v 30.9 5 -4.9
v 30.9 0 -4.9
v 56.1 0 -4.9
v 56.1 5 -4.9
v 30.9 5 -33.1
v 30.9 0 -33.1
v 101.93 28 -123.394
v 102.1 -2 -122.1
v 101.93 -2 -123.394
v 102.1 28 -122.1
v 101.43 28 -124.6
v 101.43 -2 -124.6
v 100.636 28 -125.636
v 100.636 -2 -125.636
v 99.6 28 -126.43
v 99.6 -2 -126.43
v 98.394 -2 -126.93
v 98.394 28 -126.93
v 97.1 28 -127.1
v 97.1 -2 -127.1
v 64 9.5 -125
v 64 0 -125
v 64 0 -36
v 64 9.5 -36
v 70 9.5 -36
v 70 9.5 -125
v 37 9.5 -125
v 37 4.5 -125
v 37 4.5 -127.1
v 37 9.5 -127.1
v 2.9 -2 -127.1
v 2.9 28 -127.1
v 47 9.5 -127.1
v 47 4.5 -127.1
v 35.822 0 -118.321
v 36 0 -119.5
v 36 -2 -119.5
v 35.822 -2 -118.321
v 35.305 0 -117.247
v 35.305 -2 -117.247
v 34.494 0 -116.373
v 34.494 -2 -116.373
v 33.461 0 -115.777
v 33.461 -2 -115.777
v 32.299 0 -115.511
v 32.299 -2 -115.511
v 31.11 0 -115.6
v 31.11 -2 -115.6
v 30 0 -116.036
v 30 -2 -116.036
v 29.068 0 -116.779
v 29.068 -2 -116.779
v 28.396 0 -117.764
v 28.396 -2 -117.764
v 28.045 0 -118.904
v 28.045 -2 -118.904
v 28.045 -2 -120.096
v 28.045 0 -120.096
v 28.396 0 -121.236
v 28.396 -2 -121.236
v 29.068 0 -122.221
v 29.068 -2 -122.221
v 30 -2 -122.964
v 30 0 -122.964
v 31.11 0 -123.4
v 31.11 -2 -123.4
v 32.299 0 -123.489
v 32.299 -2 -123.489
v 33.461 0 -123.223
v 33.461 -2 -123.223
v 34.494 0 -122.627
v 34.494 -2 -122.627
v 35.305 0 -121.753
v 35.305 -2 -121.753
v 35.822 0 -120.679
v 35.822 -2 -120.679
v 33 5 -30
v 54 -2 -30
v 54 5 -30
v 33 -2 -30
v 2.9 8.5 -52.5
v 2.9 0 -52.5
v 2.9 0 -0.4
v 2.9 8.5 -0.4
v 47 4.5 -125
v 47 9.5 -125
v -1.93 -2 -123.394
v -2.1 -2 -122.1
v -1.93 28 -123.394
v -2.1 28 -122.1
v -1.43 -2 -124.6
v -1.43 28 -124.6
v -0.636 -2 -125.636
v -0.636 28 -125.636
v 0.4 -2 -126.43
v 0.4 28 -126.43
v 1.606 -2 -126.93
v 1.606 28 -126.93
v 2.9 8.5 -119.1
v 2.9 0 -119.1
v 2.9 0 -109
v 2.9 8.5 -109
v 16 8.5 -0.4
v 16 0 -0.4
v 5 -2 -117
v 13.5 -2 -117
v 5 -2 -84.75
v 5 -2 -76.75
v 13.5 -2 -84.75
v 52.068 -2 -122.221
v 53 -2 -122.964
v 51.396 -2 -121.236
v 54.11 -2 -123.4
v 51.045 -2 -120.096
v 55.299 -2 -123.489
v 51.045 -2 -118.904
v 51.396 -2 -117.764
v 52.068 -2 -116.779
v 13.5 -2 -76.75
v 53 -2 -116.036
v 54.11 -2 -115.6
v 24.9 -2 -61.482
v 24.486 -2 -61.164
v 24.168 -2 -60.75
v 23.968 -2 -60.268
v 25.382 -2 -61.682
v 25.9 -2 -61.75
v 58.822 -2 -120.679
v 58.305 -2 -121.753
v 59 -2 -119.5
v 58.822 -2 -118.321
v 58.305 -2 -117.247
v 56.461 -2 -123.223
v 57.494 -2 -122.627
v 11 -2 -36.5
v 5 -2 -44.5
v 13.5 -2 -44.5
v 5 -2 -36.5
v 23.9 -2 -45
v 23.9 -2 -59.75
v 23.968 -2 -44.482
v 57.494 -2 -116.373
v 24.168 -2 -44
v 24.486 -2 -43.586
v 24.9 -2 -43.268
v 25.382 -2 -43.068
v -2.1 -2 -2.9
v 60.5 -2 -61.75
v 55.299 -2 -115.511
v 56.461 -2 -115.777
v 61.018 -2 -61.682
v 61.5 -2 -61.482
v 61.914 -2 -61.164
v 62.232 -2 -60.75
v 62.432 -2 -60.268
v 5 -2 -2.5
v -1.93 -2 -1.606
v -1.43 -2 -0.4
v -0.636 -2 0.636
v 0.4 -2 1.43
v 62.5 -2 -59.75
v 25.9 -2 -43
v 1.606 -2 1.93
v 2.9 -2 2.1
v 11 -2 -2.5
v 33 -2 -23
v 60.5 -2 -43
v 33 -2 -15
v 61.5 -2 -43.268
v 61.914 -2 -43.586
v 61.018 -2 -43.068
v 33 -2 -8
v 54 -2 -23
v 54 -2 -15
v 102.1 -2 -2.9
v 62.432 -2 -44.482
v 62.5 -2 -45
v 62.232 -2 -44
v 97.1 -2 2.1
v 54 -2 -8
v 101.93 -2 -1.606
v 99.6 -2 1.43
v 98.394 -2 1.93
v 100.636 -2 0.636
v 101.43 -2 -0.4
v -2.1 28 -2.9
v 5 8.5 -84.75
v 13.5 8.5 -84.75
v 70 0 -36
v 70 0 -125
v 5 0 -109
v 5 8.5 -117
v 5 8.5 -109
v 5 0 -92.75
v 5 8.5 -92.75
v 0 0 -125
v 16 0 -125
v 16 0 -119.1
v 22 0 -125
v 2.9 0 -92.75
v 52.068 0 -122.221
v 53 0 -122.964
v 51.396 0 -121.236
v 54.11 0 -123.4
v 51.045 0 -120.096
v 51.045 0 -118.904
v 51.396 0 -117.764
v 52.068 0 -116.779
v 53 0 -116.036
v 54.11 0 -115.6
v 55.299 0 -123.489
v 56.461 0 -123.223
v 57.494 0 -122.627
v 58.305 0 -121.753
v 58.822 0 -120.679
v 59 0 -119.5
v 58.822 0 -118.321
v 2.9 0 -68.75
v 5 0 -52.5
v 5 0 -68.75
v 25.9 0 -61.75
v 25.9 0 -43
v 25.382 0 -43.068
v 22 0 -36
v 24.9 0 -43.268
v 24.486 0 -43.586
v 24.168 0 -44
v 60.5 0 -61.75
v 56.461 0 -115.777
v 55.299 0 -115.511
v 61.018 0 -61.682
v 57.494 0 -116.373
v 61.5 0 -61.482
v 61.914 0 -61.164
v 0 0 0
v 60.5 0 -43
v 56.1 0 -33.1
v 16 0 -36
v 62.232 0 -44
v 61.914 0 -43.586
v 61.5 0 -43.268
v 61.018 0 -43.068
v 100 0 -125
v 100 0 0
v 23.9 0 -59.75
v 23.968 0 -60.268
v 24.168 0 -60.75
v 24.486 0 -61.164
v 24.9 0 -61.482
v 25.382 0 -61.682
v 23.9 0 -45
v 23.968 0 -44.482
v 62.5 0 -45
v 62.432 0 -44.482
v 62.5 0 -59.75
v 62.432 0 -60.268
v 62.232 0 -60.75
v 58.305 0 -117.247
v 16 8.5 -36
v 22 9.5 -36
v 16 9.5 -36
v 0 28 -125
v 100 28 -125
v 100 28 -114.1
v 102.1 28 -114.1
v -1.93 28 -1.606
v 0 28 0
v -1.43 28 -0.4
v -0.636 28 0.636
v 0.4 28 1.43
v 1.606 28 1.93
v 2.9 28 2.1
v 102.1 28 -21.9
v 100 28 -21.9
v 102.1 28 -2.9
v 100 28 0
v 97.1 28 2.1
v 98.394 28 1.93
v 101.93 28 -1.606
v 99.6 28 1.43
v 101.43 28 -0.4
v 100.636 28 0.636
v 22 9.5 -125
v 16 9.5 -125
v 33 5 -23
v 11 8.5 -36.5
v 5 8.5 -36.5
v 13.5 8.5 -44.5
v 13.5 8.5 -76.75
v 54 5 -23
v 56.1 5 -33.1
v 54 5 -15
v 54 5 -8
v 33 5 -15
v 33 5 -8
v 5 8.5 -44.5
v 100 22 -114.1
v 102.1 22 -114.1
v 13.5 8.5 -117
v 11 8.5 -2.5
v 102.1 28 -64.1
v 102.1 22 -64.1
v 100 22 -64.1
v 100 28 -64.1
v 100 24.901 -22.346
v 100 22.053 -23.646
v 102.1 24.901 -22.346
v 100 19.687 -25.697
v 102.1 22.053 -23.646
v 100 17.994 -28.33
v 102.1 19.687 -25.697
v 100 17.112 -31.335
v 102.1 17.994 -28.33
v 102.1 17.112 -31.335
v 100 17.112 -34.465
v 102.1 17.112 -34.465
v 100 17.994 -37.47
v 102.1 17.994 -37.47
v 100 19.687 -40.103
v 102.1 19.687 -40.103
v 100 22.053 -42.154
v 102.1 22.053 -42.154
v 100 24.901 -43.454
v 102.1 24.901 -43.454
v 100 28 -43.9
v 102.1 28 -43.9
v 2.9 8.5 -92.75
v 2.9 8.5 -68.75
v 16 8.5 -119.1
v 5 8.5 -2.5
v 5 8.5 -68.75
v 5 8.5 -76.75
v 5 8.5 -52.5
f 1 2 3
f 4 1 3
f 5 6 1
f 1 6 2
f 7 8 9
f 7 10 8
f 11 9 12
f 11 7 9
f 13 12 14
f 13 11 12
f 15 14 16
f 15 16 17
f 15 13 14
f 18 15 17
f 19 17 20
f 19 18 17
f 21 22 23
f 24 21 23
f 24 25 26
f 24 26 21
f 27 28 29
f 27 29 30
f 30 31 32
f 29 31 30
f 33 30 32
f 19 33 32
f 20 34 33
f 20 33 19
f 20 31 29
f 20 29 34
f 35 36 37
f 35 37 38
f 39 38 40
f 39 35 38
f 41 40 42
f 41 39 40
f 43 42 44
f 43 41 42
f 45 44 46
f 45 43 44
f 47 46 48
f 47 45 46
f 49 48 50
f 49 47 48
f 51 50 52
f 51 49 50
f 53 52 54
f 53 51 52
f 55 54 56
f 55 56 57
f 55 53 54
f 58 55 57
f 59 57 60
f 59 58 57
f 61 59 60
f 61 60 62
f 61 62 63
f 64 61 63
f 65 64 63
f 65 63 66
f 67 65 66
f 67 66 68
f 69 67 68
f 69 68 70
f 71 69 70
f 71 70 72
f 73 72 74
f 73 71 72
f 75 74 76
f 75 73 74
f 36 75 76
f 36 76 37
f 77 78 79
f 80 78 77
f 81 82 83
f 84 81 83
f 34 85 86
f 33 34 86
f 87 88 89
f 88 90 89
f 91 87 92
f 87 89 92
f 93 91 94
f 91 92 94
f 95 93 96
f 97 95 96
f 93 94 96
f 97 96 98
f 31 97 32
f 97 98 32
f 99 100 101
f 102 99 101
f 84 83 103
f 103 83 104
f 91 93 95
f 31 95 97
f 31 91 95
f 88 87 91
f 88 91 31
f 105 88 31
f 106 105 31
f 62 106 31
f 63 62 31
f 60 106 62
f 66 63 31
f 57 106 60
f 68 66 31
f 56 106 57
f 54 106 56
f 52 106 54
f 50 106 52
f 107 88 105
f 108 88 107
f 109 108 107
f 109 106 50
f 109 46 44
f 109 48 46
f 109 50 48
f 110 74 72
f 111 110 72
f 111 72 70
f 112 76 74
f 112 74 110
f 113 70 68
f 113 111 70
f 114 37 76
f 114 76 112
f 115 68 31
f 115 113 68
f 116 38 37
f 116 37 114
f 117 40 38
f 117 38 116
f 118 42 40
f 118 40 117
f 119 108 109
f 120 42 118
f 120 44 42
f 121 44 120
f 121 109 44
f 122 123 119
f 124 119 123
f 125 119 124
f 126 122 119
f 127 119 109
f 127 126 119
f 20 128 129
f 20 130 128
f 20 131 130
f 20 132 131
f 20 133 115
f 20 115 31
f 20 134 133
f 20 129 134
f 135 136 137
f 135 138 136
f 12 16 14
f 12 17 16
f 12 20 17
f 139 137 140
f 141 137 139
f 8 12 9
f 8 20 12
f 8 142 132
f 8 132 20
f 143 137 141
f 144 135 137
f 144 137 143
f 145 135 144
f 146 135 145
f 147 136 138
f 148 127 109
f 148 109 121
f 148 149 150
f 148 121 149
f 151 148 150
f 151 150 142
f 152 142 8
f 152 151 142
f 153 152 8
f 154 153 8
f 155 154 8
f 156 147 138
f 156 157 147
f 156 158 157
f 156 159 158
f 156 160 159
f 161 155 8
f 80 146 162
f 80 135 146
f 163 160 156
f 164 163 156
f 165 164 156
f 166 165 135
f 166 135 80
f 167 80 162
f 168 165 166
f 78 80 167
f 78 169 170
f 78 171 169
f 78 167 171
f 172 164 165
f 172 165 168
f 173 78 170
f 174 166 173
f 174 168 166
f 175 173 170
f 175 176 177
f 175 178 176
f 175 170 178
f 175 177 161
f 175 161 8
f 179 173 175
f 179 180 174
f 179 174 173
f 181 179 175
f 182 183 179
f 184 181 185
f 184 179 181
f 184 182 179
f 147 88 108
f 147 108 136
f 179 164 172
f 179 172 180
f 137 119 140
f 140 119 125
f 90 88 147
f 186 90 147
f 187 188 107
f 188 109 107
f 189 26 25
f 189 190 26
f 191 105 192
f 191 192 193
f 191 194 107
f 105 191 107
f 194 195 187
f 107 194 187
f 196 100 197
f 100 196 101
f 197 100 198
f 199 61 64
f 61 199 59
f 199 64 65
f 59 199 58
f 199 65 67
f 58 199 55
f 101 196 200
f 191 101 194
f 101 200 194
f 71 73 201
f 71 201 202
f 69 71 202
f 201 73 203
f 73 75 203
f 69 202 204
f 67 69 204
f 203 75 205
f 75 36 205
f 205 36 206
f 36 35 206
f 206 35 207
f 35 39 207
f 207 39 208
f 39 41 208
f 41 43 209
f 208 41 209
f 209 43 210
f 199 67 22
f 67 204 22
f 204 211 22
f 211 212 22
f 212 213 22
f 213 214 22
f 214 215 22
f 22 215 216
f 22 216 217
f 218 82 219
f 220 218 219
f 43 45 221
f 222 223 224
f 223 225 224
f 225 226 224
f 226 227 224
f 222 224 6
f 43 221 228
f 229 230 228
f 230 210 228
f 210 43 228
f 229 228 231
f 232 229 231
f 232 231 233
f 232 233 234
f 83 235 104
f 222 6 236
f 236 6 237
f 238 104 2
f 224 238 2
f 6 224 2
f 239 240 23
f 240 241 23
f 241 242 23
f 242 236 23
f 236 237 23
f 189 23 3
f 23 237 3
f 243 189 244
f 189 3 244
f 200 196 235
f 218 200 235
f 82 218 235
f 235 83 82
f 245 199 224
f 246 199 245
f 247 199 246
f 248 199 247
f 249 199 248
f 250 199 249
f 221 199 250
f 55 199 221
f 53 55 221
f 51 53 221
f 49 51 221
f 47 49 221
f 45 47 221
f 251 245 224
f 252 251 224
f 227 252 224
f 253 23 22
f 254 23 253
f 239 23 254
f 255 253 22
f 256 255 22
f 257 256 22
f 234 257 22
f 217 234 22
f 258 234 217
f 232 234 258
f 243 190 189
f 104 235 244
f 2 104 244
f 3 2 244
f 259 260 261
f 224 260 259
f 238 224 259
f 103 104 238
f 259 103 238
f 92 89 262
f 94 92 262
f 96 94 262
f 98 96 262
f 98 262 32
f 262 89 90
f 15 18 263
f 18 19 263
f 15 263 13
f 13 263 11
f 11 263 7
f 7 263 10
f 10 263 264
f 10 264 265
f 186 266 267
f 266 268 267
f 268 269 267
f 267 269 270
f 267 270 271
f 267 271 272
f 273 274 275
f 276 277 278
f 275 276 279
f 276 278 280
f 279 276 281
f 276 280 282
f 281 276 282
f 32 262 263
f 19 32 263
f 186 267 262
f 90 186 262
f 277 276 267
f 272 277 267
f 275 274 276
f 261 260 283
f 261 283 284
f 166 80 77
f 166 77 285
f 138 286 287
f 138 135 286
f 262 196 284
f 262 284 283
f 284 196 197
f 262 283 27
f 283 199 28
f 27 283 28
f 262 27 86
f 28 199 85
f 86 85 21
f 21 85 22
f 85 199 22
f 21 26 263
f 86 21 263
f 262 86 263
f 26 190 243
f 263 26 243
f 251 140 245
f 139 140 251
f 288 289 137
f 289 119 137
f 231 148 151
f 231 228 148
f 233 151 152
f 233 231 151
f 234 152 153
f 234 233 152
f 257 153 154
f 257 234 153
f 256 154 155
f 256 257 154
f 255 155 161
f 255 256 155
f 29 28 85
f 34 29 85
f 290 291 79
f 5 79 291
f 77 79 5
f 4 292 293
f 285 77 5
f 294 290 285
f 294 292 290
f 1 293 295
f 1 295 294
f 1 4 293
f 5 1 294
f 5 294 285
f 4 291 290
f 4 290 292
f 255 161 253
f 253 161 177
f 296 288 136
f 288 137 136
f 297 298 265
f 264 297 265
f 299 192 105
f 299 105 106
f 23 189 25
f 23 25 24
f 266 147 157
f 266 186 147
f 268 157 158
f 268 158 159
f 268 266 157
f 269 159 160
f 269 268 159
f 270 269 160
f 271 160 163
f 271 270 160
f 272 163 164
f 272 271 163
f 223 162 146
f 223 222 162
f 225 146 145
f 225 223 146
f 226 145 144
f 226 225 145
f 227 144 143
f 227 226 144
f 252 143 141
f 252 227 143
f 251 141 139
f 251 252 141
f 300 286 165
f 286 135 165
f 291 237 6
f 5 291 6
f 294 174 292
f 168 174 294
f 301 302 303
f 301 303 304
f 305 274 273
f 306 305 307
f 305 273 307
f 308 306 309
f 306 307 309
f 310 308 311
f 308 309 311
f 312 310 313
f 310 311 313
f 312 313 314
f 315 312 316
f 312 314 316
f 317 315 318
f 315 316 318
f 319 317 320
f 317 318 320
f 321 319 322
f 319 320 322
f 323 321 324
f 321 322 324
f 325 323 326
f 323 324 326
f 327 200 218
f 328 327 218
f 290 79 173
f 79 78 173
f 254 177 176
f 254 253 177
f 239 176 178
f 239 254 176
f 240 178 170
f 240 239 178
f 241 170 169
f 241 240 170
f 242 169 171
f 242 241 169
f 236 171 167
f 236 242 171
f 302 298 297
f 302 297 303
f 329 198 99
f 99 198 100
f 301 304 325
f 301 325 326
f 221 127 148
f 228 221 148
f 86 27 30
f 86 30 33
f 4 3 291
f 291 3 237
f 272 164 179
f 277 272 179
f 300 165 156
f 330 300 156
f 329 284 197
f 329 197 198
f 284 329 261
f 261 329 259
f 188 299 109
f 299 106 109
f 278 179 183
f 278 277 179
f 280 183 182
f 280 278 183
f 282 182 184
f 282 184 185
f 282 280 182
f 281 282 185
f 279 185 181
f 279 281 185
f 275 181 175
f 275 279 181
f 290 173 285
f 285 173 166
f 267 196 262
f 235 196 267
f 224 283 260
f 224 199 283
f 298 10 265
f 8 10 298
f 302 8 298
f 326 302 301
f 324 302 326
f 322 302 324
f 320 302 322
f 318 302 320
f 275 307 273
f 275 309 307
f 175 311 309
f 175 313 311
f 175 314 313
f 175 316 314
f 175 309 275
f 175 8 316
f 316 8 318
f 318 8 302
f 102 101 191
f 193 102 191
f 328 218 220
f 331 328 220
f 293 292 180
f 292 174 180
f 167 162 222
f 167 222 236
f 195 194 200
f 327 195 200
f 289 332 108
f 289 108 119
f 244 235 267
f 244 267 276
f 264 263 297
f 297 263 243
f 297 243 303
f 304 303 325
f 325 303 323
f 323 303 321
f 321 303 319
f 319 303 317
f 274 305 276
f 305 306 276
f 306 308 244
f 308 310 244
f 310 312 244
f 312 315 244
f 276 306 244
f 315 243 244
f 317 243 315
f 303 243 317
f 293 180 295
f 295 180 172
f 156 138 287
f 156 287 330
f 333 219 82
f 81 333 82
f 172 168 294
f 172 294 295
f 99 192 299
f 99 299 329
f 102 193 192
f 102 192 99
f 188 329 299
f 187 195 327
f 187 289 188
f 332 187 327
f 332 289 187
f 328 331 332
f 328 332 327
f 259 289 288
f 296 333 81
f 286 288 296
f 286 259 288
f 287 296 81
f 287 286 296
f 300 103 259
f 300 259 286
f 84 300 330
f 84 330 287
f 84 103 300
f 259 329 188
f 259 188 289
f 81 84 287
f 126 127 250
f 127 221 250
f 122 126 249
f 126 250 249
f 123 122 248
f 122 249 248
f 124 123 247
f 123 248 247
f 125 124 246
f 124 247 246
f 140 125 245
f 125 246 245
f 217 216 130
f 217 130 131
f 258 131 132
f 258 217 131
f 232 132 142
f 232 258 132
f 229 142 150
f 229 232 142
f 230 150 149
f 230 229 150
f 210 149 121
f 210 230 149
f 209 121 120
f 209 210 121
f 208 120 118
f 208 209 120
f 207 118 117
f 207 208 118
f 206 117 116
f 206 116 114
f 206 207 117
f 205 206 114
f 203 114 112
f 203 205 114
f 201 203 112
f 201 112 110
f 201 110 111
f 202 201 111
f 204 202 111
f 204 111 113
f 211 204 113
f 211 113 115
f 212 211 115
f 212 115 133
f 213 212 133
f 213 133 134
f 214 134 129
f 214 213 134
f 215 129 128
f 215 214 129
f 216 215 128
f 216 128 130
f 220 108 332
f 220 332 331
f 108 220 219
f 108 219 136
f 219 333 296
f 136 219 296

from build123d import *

# Parameters (mm, degrees)
F0_W      = 100
F0_H      = 125
F0_W_2    = 8.5
F0_H_2    = 32.25
F0_R      = 4
F0_R_2    = 2.75
F0_R_3    = 2
F0_W_3    = 6
F0_H_3    = 34
F0_W_4    = 21
F0_H_4    = 7
F1_DEPTH  = 2
F2_W      = 6
F2_H      = 89
F3_DEPTH  = 8.5
F5_DEPTH  = 8.5
F6_W      = 6
F6_H      = 34
F7_DEPTH  = 8.5
F8_W      = 21
F8_H      = 7
F9_DEPTH  = 5
F10_W     = 104.2
F10_H     = 129.2
F10_W_2   = 100
F10_H_2   = 125
F11_DEPTH = 30
F12_R     = 11
F12_W     = 12
F12_H     = 50
F13_DEPTH = 5
F14_R     = 3.75
F15_DEPTH = 1
F16_W     = 6
F16_H     = 89
F17_DEPTH = 1
F18_W     = 6
F18_H     = 89
F19_DEPTH = 1
F20_W     = 10
F20_H     = 5
F21_DEPTH = 5
F22_R     = 5
F23_W     = 38.6
F23_H     = 18.75
F23_R     = 2.75
F23_R_2   = 2
F24_DEPTH = 25
F25_R     = 2


with BuildPart() as f1:
    # F0 (on Front) → F1 (new body)
    with BuildSketch(Plane.XZ):
        with Locations((50, -62.5)):
            Rectangle(F0_W, F0_H)
        with Locations((9.25, -100.875)):
            Rectangle(F0_W_2, F0_H_2, mode=Mode.SUBTRACT)
        with Locations((32, -119.5)):
            Circle(F0_R, mode=Mode.SUBTRACT)
        with Locations((55, -119.5)):
            Circle(F0_R, mode=Mode.SUBTRACT)
        with Locations((9.25, -60.625)):
            Rectangle(F0_W_2, F0_H_2, mode=Mode.SUBTRACT)
        with Locations((34, -56)):
            Circle(F0_R_2, mode=Mode.SUBTRACT)
        with Locations((27.5, -47)):
            Circle(F0_R_3, mode=Mode.SUBTRACT)
        with Locations((8, -19.5)):
            Rectangle(F0_W_3, F0_H_3, mode=Mode.SUBTRACT)
        with Locations((43.5, -26.5)):
            Rectangle(F0_W_4, F0_H_4, mode=Mode.SUBTRACT)
        with Locations((43.5, -11.5)):
            Rectangle(F0_W_4, F0_H_4, mode=Mode.SUBTRACT)
        with Locations((52, -56)):
            Circle(F0_R_2, mode=Mode.SUBTRACT)
        with Locations((58.5, -47)):
            Circle(F0_R_3, mode=Mode.SUBTRACT)
    extrude(amount=F1_DEPTH)

    # F2 (on face) → F3 (join)
    with BuildSketch(Plane(origin=(0, 0, 0), x_dir=(-1, 0, 0), z_dir=(0, 1, 0))):
        Polygon((-22, -125), (-16, -125), (-16, -117), (-16, -36), (-22, -36), align=None)
        with Locations((-67, -80.5)):
            Rectangle(F2_W, F2_H)
    extrude(amount=F3_DEPTH)

    # F4 (on face) → F5 (join)
    with BuildSketch(Plane(origin=(0, 0, 0), x_dir=(-1, 0, 0), z_dir=(0, 1, 0))):
        Polygon((-16, -119.1), (-5, -119.1), (-2.9, -119.1), (-2.9, -109), (-5, -109), (-5, -117), (-13.5, -117), (-13.5, -84.75), (-5, -84.75), (-5, -92.75), (-2.9, -92.75), (-2.9, -82.65), (-5, -82.65), (-16, -82.65), align=None)
        Polygon((-16, -78.85), (-16, -82.65), (-5, -82.65), (-2.9, -82.65), (-2.9, -78.85), (-5, -78.85), align=None)
        Polygon((-16, -42.4), (-16, -78.85), (-5, -78.85), (-2.9, -78.85), (-2.9, -68.75), (-5, -68.75), (-5, -76.75), (-13.5, -76.75), (-13.5, -44.5), (-5, -44.5), (-5, -52.5), (-2.9, -52.5), (-2.9, -42.4), align=None)
    extrude(amount=F5_DEPTH)

    # F6 (on face) → F7 (join)
    with BuildSketch(Plane(origin=(0, 0, 0), x_dir=(-1, 0, 0), z_dir=(0, 1, 0))):
        Polygon((-2.9, -38.6), (-5, -38.6), (-16, -38.6), (-16, -42.4), (-2.9, -42.4), align=None)
        Polygon((-16, -38.6), (-5, -38.6), (-2.9, -38.6), (-2.9, -0.4), (-16, -0.4), align=None)
        with Locations((-8, -19.5)):
            Rectangle(F6_W, F6_H, mode=Mode.SUBTRACT)
    extrude(amount=F7_DEPTH)

    # F8 (on face) → F9 (join)
    with BuildSketch(Plane(origin=(0, 0, 0), x_dir=(-1, 0, 0), z_dir=(0, 1, 0))):
        Polygon((-56.1, -33.1), (-54, -33.1), (-30.9, -33.1), (-30.9, -19.9), (-56.1, -19.9), align=None)
        with Locations((-43.5, -26.5)):
            Rectangle(F8_W, F8_H, mode=Mode.SUBTRACT)
        Polygon((-56.1, -18.1), (-56.1, -19.9), (-30.9, -19.9), (-30.9, -18.1), (-54, -18.1), align=None)
        Polygon((-56.1, -4.9), (-56.1, -18.1), (-54, -18.1), (-30.9, -18.1), (-30.9, -4.9), align=None)
        with Locations((-43.5, -11.5)):
            Rectangle(F8_W, F8_H, mode=Mode.SUBTRACT)
    extrude(amount=F9_DEPTH)

    # F10 (on face) → F11 (join)
    with BuildSketch(Plane.XZ.offset(2)):
        with Locations((50, -62.5)):
            Rectangle(F10_W, F10_H)
        with Locations((50, -62.5)):
            Rectangle(F10_W_2, F10_H_2, mode=Mode.SUBTRACT)
    extrude(amount=-F11_DEPTH)

    # F12 (on face) → F13 (cut)
    with BuildSketch(Plane.YZ.offset(102.1)):
        with Locations((28, -32.9)):
            Circle(F12_R)
        with Locations((28, -89.1)):
            Rectangle(F12_W, F12_H)
    extrude(amount=-F13_DEPTH, mode=Mode.SUBTRACT)

    # F14 (on face) → F15 (cut)
    with BuildSketch(Plane(origin=(0, 0, 0), x_dir=(-1, 0, 0), z_dir=(0, 1, 0))):
        with Locations((-34, -56)):
            Circle(F14_R)
        with Locations((-52, -56)):
            Circle(F14_R)
    extrude(amount=-F15_DEPTH, mode=Mode.SUBTRACT)

    # F16 (on face) → F17 (join)
    with BuildSketch(Plane(origin=(0, 8.5, 0), x_dir=(-1, 0, 0), z_dir=(0, 1, 0))):
        with Locations((-19, -80.5)):
            Rectangle(F16_W, F16_H)
    extrude(amount=F17_DEPTH)

    # F18 (on face) → F19 (join)
    with BuildSketch(Plane(origin=(0, 8.5, 0), x_dir=(-1, 0, 0), z_dir=(0, 1, 0))):
        with Locations((-67, -80.5)):
            Rectangle(F18_W, F18_H)
    extrude(amount=F19_DEPTH)

    # F20 (on face) → F21 (cut)
    with BuildSketch(Plane.XY.offset(-125)):
        with Locations((42, 7)):
            Rectangle(F20_W, F20_H)
    extrude(amount=-F21_DEPTH, mode=Mode.SUBTRACT)

    # F22
    f22_edges = [f1.edges().sort_by_distance(p)[0] for p in [
        (102.1, 13, 2.1),
        (-2.1, 13, 2.1),
        (-2.1, 13, -127.1),
        (102.1, 13, -127.1),
    ]]
    fillet(f22_edges, radius=F22_R)

    # F23 (on face) → F24 (cut)
    with BuildSketch(Plane.XZ.offset(2)):
        with Locations((43.2, -52.375)):
            Rectangle(F23_W, F23_H)
        with Locations((34, -56)):
            Circle(F23_R, mode=Mode.SUBTRACT)
        with Locations((27.5, -47)):
            Circle(F23_R_2, mode=Mode.SUBTRACT)
        with Locations((52, -56)):
            Circle(F23_R, mode=Mode.SUBTRACT)
        with Locations((58.5, -47)):
            Circle(F23_R_2, mode=Mode.SUBTRACT)
    extrude(amount=-F24_DEPTH, mode=Mode.SUBTRACT)

    # F25
    f25_edges = [f1.edges().sort_by_distance(p)[0] for p in [
        (23.9, -1, -43),
        (62.5, -1, -43),
        (23.9, -1, -61.75),
        (62.5, -1, -61.75),
    ]]
    fillet(f25_edges, radius=F25_R)


solid = f1.part
